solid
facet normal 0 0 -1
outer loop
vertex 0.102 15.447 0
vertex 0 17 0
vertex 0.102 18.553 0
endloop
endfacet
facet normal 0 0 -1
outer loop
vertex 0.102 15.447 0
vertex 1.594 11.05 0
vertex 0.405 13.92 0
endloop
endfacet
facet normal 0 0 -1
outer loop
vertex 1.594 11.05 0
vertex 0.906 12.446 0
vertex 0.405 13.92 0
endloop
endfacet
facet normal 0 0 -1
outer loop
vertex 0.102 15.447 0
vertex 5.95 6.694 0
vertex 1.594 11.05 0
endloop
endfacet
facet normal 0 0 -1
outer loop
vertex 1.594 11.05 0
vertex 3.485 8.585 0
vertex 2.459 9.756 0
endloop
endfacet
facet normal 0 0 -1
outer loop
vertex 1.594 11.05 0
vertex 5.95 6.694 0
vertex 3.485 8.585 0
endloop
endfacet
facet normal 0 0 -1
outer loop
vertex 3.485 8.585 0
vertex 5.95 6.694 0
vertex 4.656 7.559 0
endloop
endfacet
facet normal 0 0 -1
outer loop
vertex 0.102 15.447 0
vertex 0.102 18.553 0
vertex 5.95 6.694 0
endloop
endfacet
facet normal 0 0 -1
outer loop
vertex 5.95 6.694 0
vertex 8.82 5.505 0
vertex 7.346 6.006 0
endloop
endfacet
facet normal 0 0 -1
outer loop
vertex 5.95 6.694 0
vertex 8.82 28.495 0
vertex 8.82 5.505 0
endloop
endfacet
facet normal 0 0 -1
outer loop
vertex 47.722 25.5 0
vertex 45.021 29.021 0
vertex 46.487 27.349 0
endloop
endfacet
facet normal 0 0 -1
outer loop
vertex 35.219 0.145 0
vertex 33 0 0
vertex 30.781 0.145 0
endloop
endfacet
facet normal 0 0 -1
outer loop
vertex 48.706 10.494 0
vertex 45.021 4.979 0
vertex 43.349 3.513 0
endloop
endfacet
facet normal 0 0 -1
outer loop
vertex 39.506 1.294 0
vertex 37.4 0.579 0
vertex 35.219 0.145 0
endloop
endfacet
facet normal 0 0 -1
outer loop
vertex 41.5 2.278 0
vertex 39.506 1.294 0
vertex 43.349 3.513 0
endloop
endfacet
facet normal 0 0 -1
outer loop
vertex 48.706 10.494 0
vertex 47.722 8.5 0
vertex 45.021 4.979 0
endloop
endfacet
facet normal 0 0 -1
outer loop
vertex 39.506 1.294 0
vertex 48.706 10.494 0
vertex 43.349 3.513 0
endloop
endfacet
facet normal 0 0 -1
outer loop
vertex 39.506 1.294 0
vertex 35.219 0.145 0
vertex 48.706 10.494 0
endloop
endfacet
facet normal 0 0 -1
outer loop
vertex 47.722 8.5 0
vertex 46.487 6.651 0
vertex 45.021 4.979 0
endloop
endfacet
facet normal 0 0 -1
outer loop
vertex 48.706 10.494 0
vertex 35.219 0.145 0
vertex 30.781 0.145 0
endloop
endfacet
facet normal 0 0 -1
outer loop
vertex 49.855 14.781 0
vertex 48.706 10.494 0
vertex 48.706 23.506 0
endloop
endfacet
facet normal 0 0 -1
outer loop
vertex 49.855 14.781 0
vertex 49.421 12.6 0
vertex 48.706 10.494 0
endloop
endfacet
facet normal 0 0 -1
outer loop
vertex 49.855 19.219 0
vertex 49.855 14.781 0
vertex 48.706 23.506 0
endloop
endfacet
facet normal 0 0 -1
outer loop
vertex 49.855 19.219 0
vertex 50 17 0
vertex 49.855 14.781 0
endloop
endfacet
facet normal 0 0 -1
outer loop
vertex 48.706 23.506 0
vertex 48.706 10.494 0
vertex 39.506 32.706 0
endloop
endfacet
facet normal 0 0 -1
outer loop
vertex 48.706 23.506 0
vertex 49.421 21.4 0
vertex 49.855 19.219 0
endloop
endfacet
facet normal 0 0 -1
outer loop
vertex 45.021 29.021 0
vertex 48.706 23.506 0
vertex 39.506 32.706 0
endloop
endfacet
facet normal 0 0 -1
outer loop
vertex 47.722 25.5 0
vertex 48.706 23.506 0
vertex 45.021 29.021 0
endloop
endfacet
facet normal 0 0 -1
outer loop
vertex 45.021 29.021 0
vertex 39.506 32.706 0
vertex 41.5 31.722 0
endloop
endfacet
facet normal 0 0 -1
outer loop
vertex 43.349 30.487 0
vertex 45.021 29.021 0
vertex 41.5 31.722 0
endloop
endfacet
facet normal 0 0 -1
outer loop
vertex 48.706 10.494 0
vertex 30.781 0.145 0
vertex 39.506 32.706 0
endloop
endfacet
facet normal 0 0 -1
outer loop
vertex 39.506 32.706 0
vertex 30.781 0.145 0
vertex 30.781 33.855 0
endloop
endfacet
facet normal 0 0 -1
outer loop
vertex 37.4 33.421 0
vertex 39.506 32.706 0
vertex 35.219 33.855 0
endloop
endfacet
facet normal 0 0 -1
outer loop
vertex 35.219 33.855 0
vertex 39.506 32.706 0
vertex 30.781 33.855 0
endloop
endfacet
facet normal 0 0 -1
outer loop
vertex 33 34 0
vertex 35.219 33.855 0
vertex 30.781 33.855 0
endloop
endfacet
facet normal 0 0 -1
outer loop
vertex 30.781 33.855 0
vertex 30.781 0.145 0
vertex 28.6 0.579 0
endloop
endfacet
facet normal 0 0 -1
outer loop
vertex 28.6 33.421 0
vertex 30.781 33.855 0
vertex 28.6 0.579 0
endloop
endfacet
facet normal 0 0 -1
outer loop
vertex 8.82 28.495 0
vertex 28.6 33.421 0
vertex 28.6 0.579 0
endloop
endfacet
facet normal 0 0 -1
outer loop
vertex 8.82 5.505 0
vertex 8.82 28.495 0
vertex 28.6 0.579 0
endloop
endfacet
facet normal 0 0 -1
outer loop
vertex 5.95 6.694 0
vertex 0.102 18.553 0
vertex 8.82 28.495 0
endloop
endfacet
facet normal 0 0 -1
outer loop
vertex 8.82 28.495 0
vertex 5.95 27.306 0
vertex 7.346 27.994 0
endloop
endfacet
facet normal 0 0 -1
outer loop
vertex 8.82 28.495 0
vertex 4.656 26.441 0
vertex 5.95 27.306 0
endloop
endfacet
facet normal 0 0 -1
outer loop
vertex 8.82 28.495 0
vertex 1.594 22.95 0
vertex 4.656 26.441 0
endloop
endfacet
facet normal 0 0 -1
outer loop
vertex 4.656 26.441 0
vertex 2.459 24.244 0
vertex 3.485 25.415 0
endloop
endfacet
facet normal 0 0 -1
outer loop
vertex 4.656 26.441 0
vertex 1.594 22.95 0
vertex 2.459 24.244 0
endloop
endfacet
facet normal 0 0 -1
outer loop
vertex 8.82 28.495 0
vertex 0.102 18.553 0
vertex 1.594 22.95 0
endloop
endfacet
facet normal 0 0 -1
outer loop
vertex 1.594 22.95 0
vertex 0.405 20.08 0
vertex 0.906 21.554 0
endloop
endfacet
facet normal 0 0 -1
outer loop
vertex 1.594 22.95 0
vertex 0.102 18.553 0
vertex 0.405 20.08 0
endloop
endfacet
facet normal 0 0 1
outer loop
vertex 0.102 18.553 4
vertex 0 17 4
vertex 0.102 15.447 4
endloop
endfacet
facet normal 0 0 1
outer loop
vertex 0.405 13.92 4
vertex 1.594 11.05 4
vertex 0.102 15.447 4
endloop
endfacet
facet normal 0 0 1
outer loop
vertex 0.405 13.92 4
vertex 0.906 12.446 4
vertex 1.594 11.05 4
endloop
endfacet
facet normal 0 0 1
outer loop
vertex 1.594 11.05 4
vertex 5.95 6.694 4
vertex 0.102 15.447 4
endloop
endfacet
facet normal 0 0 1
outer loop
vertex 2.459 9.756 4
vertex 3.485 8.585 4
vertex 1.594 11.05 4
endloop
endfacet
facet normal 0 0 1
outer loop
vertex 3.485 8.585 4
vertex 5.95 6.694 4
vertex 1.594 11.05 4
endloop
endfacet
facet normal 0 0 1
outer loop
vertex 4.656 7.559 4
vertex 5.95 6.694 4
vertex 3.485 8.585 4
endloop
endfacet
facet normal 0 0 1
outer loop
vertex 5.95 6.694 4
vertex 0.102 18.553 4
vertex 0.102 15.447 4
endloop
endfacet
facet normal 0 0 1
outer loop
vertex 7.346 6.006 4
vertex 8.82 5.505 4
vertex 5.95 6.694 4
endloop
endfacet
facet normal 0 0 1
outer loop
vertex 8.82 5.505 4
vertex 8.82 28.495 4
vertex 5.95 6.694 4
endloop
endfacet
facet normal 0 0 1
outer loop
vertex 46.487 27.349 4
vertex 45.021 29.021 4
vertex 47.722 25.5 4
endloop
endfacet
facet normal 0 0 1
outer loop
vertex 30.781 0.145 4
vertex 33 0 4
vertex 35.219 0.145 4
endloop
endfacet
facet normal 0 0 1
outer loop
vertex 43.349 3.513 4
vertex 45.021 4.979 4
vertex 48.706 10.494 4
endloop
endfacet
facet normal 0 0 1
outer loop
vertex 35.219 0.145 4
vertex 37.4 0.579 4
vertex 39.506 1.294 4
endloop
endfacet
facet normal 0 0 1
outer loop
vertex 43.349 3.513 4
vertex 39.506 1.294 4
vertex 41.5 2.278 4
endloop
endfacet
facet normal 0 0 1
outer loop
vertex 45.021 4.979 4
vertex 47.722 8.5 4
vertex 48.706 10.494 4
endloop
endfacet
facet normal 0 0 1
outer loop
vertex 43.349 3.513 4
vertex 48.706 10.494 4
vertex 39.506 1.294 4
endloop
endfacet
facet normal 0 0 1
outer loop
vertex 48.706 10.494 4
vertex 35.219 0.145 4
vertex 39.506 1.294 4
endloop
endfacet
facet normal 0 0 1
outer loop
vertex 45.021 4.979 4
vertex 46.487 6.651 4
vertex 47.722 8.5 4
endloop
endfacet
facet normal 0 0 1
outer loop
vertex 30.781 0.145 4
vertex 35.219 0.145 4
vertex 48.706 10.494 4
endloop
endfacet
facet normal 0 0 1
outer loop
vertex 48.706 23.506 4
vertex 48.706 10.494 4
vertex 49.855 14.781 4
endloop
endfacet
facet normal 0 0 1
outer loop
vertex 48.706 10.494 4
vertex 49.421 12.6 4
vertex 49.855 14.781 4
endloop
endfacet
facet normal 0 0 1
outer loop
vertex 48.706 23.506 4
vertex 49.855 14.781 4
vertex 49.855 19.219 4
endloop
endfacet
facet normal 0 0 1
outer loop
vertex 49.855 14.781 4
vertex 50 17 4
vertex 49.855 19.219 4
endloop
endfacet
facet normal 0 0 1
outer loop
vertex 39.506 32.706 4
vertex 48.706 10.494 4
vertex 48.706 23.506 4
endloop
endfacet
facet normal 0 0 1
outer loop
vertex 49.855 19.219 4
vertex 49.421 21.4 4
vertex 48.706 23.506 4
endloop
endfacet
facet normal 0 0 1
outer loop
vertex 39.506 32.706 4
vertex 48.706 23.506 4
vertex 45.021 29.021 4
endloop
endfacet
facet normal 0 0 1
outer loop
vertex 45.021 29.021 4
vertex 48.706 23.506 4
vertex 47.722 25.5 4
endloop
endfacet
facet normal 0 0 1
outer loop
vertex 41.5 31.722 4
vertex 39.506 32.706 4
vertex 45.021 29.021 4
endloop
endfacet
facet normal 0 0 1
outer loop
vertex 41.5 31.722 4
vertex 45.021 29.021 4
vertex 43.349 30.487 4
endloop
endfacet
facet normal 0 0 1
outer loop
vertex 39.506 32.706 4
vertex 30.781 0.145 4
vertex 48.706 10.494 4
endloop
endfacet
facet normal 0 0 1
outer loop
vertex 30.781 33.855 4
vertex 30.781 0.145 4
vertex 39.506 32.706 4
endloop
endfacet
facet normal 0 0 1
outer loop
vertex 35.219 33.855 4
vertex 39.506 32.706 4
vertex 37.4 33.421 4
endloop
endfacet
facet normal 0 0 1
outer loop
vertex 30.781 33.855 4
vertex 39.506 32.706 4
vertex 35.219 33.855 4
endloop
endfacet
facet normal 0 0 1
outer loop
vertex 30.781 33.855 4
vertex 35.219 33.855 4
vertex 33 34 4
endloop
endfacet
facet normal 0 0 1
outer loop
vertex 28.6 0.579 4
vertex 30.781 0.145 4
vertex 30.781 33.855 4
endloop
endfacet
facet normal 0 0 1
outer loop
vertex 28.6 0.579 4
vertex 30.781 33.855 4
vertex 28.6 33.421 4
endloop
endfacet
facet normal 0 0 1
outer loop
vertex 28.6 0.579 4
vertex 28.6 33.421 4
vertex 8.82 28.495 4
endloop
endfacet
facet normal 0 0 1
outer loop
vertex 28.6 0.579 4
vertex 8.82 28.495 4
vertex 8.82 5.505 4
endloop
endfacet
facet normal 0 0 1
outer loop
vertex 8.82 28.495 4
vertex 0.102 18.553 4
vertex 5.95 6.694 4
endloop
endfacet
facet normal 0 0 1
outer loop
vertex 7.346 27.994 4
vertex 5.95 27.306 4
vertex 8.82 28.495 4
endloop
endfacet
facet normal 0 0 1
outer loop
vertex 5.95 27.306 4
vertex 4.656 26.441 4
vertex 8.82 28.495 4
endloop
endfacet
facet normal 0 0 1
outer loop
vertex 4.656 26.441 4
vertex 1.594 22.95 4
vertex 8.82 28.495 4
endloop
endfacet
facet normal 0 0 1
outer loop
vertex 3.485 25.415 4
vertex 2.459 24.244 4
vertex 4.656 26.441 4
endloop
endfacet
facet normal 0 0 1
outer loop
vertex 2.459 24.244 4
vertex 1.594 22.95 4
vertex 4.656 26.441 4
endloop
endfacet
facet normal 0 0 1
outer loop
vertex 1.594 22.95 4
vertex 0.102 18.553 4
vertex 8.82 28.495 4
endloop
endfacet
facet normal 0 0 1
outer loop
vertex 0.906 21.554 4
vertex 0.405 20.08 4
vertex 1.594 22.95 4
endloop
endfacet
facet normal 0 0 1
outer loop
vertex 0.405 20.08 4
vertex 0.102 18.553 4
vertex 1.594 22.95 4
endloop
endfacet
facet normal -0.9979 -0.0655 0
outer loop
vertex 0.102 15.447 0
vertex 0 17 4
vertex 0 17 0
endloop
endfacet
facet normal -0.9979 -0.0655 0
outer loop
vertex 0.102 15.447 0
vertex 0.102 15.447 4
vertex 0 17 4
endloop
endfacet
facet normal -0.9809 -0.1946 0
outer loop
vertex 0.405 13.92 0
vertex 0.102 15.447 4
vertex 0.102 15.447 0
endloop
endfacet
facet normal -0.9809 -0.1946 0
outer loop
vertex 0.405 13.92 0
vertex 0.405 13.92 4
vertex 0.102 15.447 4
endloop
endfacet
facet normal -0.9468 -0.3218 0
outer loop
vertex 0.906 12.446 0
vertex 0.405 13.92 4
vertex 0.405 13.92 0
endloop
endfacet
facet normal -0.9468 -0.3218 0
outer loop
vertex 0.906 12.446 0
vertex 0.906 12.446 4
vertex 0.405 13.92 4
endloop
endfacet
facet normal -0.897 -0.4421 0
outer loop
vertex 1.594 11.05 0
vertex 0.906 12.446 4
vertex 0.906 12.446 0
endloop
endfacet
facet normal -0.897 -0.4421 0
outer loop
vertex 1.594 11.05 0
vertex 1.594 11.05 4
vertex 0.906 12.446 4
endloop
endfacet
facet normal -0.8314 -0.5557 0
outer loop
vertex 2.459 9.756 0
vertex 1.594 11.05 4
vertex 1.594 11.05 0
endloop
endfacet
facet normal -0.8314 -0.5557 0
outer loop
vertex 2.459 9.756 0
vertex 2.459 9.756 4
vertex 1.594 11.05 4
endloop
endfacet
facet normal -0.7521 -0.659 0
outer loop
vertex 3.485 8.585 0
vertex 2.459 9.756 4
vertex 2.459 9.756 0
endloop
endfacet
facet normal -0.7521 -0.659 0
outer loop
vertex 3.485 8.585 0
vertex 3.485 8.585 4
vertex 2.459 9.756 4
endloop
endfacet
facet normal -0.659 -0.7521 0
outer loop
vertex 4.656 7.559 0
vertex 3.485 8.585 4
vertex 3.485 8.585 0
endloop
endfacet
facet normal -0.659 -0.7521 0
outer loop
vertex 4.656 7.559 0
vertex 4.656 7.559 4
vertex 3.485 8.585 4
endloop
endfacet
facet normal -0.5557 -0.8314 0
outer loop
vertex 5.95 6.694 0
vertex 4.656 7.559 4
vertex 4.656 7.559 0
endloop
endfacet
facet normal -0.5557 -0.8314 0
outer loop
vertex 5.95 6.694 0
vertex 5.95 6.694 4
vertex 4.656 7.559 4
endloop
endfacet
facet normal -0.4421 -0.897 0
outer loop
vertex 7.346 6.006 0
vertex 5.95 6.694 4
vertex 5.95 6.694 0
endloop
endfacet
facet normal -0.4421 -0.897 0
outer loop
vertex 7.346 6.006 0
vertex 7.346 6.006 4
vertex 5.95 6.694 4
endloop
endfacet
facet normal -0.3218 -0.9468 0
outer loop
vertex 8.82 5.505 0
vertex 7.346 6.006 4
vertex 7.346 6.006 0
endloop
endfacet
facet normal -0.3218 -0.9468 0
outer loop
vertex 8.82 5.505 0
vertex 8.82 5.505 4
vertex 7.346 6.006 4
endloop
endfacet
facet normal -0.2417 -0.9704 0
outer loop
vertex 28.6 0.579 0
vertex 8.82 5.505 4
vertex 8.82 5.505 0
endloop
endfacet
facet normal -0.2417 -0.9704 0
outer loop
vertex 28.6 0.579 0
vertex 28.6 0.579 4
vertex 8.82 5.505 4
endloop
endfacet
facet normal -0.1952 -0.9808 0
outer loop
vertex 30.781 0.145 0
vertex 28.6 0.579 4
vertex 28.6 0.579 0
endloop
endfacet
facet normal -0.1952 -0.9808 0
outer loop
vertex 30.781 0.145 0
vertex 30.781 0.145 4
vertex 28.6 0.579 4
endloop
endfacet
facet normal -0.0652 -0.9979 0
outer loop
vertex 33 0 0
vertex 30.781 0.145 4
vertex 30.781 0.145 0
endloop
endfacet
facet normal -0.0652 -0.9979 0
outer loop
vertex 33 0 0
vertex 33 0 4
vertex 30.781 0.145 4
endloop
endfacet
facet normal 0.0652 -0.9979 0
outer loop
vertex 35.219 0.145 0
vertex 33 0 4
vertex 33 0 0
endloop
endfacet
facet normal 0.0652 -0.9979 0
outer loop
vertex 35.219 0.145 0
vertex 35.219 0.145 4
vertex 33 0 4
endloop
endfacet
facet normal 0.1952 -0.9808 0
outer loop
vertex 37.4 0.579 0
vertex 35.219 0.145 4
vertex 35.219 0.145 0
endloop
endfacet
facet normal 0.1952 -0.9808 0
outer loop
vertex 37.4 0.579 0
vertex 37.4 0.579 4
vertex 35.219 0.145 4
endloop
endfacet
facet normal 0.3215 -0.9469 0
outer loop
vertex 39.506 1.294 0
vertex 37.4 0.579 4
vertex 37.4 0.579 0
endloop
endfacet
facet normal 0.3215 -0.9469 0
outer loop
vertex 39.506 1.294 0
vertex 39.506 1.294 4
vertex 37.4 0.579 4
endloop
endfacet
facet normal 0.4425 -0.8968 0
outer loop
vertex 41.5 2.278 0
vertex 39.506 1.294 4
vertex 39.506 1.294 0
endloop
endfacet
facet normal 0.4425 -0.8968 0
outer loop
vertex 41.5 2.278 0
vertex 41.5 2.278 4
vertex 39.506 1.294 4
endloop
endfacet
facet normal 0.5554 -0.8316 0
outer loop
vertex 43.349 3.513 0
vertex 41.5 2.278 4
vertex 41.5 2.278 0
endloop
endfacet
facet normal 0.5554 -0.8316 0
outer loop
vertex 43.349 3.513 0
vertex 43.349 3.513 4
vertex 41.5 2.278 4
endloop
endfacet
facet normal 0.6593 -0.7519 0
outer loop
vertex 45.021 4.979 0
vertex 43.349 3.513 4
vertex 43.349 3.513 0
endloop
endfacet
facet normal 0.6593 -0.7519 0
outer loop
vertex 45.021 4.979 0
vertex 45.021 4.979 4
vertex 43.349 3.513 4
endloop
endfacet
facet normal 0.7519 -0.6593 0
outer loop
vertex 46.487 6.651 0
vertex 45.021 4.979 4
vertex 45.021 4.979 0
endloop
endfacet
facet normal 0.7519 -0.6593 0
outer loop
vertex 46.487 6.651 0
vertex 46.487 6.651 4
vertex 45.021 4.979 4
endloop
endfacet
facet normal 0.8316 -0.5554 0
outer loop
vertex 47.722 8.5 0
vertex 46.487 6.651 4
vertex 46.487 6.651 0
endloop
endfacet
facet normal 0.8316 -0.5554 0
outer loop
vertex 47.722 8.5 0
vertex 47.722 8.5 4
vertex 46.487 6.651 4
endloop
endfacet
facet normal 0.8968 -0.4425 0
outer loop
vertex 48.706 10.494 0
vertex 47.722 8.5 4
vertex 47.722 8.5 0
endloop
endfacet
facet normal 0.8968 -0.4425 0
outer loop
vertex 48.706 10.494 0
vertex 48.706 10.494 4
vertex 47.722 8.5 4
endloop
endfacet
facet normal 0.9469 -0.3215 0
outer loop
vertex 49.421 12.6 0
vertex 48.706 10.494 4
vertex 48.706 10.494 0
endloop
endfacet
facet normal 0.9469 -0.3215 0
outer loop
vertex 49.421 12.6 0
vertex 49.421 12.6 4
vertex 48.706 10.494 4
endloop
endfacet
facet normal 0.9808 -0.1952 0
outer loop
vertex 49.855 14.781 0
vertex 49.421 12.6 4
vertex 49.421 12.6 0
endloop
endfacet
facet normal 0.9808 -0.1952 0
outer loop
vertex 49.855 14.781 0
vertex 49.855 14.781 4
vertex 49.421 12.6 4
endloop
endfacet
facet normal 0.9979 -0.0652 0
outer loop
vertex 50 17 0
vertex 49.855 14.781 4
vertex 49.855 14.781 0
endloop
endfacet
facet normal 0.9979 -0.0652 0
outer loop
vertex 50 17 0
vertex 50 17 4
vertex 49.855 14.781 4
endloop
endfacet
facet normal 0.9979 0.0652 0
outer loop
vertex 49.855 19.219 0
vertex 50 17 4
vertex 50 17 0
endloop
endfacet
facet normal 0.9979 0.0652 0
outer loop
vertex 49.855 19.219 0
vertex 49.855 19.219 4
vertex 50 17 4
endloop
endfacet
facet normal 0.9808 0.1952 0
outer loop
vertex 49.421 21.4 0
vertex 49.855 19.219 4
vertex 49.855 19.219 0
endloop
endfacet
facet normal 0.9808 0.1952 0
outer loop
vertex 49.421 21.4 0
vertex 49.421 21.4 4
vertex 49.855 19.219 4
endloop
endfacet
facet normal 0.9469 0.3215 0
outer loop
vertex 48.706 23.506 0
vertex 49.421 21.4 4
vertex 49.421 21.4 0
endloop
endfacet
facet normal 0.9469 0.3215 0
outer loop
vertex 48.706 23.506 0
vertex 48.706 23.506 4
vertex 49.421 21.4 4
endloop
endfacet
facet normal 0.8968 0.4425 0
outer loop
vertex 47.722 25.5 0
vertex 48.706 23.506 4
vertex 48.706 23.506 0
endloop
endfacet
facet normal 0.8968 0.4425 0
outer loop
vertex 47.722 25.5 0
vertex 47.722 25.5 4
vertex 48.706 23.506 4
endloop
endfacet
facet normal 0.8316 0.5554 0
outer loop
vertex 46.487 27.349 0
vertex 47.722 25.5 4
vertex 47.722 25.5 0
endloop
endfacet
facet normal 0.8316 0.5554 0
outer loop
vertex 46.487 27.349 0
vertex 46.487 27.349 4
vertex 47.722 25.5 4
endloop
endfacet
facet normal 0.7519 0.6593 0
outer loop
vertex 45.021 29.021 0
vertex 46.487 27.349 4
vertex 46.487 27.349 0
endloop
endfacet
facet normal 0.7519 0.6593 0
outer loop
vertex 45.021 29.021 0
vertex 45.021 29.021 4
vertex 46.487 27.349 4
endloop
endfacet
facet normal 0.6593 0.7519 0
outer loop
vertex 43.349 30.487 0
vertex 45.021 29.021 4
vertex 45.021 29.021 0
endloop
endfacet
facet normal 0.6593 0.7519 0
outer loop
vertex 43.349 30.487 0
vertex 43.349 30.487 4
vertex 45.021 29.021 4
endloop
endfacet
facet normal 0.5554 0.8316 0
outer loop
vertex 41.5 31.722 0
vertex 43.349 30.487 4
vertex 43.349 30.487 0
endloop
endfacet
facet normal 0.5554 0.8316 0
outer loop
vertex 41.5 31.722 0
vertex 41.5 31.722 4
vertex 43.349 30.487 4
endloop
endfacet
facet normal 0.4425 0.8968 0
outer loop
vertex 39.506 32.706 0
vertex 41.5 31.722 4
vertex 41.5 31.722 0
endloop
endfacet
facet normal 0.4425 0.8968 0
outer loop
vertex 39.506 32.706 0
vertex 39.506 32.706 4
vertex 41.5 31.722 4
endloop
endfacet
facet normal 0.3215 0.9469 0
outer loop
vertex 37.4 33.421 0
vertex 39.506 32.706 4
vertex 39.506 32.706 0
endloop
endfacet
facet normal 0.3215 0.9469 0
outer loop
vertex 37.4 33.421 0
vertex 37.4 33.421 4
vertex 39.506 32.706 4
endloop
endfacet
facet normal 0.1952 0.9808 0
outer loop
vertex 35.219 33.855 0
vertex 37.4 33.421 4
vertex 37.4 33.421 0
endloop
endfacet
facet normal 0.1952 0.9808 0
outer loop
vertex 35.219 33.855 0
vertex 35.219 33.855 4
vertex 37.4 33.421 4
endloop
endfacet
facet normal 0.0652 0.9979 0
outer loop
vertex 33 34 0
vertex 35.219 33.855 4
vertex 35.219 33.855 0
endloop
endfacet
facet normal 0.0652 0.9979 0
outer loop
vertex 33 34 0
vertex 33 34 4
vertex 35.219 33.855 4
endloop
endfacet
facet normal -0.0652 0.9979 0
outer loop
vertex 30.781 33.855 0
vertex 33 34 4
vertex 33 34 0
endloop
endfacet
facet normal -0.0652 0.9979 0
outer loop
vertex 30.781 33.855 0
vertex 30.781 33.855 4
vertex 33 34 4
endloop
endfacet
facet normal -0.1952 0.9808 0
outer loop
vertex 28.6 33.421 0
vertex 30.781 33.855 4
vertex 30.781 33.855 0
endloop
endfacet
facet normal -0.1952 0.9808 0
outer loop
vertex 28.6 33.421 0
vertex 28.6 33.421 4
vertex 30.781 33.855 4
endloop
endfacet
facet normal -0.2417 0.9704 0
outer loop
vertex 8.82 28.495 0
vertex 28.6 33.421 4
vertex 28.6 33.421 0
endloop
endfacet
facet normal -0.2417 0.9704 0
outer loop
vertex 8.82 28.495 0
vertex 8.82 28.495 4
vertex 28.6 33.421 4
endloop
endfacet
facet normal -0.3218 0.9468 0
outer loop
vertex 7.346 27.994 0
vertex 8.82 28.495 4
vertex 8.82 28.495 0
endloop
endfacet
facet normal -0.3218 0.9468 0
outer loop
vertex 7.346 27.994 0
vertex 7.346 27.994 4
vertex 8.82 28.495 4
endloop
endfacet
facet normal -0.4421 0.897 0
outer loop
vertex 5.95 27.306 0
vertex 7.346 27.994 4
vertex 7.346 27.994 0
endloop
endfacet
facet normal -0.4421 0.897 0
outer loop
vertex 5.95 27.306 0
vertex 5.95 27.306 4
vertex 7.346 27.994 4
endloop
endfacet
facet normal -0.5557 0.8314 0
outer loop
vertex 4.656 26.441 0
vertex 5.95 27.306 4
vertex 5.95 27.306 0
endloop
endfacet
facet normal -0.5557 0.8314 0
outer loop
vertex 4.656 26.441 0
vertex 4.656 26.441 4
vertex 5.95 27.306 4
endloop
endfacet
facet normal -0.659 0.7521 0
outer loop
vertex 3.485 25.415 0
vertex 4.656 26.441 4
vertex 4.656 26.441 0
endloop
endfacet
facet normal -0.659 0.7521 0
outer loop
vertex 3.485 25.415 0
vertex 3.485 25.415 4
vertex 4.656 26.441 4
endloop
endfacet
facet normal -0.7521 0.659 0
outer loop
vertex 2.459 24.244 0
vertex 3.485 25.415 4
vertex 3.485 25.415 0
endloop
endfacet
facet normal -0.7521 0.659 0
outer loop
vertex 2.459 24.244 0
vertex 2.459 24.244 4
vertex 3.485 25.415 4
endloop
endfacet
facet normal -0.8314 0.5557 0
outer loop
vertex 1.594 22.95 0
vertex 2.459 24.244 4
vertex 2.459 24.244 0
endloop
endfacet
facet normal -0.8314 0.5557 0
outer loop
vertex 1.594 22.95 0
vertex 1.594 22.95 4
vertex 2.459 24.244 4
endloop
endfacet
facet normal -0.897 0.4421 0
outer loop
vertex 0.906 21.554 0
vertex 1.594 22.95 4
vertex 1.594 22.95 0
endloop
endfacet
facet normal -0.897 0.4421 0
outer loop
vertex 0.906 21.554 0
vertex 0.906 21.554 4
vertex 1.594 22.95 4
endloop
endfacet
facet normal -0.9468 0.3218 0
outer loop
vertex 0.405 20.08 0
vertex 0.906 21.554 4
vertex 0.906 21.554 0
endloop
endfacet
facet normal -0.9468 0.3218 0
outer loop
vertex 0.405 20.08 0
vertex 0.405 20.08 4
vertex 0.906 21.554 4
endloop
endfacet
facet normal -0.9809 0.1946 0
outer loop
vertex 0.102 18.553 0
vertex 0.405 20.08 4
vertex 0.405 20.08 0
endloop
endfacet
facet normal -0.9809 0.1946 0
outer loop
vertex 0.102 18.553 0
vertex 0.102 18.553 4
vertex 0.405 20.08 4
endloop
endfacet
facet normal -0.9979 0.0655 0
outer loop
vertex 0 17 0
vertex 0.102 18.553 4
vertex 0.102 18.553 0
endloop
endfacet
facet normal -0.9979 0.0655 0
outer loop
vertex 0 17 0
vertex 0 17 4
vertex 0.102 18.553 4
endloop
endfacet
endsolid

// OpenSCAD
// CI specimen: a pebble-shaped lid with an inlaid direction arrow.
// Invented dimensions; no mating fit or physical performance claim.
length_mm = 50;
width_mm = 34;
thickness_mm = 4;
inlay_depth_mm = 1.2;
piece = "composite";
$fn = 48;

module outline() {
    hull() {
        translate([width_mm*0.35, width_mm/2]) circle(r=width_mm*0.35);
        translate([length_mm-width_mm/2, width_mm/2]) circle(r=width_mm/2);
    }
}
module lid() { linear_extrude(thickness_mm) outline(); }
module arrow() {
    translate([20, 17, thickness_mm-inlay_depth_mm])
        linear_extrude(inlay_depth_mm)
            polygon([[-7,-2],[2,-2],[2,-5],[8,0],[2,5],[2,2],[-7,2]]);
}
if (piece == "shell") difference() { lid(); arrow(); }
else if (piece == "mark") arrow();
else lid();
